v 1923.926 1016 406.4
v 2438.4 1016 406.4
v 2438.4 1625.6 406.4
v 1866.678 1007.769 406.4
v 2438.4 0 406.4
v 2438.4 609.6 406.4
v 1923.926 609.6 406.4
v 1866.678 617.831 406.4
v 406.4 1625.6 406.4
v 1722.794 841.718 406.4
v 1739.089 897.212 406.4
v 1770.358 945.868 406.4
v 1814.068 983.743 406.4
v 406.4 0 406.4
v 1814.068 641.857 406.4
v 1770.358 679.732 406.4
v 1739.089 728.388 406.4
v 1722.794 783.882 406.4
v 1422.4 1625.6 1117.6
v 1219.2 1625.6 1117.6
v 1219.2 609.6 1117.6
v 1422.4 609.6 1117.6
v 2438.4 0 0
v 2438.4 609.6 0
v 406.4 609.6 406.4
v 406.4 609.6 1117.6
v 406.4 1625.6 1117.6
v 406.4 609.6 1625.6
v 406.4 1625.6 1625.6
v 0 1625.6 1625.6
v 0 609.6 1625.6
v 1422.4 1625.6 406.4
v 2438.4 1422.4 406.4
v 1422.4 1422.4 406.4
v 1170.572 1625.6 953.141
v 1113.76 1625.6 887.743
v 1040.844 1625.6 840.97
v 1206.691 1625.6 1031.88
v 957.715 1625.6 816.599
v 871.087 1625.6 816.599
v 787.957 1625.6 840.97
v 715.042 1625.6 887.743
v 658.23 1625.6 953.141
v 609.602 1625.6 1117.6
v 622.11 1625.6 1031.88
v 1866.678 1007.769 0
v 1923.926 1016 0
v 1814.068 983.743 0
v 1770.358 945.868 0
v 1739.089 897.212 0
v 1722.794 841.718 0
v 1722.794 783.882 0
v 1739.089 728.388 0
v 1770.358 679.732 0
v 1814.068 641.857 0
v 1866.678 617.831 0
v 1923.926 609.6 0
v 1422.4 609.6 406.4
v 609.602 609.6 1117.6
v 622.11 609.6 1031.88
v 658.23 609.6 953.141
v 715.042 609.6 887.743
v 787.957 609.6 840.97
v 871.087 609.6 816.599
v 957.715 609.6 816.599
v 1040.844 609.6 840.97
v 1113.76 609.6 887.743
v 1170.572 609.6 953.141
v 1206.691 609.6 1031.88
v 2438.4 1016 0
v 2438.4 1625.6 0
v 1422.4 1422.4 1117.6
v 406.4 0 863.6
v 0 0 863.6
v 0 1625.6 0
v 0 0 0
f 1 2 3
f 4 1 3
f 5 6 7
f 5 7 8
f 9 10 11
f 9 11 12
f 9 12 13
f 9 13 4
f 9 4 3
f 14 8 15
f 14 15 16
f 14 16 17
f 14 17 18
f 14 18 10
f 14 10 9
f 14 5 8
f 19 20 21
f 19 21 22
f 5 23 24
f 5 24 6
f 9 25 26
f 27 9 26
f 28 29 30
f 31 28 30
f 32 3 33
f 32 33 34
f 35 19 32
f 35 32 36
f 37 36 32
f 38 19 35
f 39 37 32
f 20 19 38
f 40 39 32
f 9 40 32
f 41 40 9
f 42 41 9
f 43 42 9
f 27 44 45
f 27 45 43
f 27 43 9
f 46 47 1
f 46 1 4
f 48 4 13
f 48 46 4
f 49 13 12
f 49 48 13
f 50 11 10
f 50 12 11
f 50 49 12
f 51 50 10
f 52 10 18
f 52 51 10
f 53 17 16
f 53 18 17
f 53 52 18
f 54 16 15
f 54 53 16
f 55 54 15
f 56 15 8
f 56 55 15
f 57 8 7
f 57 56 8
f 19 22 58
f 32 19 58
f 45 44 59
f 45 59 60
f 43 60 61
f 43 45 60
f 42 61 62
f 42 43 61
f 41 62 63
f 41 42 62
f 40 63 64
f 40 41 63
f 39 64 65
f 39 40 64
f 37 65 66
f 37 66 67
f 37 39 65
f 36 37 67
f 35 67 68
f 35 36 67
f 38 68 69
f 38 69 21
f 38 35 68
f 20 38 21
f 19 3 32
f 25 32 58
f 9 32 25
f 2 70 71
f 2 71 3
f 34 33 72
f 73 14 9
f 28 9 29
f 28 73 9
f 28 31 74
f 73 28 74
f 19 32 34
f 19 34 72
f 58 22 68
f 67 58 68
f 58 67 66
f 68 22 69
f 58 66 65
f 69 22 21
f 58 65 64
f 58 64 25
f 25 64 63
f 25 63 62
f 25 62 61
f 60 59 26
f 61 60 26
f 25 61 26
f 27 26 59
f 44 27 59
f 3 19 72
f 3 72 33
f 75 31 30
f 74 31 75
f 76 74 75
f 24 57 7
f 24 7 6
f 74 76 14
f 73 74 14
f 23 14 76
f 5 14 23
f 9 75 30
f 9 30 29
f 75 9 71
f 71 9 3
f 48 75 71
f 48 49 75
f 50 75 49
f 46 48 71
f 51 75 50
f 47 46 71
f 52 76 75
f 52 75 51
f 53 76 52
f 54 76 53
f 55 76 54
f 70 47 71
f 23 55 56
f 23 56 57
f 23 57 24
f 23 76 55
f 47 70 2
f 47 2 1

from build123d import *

# Parameters (mm, degrees)
F2_DEPTH = 1625.6
F3_DEPTH = 1625.601
F5_DEPTH = 2438.401
F7_DEPTH = 1016
F9_DEPTH = 203.2


with BuildPart() as f2:
    # F0 (on Front) → F2 (new body)
    with BuildSketch(Plane.XZ):
        Polygon((0, 1625.6), (0, 0), (98.227218, 0), (2438.4, 0), (2438.4, 406.4), (406.4, 406.4), (406.4, 1625.6), align=None)
    extrude(amount=-F2_DEPTH)

    # F1 (on Top) → F3 (cut, through all)
    with BuildSketch(Plane.XY):
        with BuildLine():
            Line((2457.325877, 609.6), (2457.325877, 1016))
            Line((2457.325877, 1016), (1923.925877, 1016))
            ThreePointArc((1923.925877, 1016), (1720.725877, 812.8), (1923.925877, 609.6))
            Line((1923.925877, 609.6), (2457.325877, 609.6))
        make_face()
    extrude(amount=F3_DEPTH, mode=Mode.SUBTRACT)

    # F4 (on face) → F5 (cut, through all)
    with BuildSketch(Plane(origin=(0, 0, 0), x_dir=(0, -1, 0), z_dir=(-1, 0, 0))):
        Polygon((308.260679, 1655.543295), (-633.554636, 1655.543295), (-609.6, 1625.6), (0, 1625.6), (0, 863.6), (198.586172, 615.367285), align=None)
        Polygon((0, 1625.6), (-609.6, 1625.6), (0, 863.6), align=None)
    extrude(amount=-F5_DEPTH, mode=Mode.SUBTRACT)


with BuildPart() as f7:
    # F6 (on face) → F7 (new body)
    with BuildSketch(Plane(origin=(0, 1625.6, 0), x_dir=(-1, 0, 0), z_dir=(0, 1, 0))):
        with BuildLine():
            Line((-406.4, 406.4), (-406.4, 1117.6))
            Line((-406.4, 1117.6), (-609.601633, 1117.6))
            ThreePointArc((-609.601633, 1117.6), (-914.400816, 813.505425), (-1219.2, 1117.6))
            Line((-1219.2, 1117.6), (-1422.4, 1117.6))
            Line((-1422.4, 1117.6), (-1422.4, 406.4))
            Line((-1422.4, 406.4), (-406.4, 406.4))
        make_face()
    extrude(amount=-F7_DEPTH)


with BuildPart() as f9:
    # F8 (on face) → F9 (new body)
    with BuildSketch(Plane(origin=(0, 1625.6, 0), x_dir=(-1, 0, 0), z_dir=(0, 1, 0))):
        Polygon((-1422.4, 406.4), (-1422.4, 1117.6), (-2438.4, 406.4), align=None)
    extrude(amount=-F9_DEPTH)


solid = Compound([f2.part, f7.part, f9.part])
